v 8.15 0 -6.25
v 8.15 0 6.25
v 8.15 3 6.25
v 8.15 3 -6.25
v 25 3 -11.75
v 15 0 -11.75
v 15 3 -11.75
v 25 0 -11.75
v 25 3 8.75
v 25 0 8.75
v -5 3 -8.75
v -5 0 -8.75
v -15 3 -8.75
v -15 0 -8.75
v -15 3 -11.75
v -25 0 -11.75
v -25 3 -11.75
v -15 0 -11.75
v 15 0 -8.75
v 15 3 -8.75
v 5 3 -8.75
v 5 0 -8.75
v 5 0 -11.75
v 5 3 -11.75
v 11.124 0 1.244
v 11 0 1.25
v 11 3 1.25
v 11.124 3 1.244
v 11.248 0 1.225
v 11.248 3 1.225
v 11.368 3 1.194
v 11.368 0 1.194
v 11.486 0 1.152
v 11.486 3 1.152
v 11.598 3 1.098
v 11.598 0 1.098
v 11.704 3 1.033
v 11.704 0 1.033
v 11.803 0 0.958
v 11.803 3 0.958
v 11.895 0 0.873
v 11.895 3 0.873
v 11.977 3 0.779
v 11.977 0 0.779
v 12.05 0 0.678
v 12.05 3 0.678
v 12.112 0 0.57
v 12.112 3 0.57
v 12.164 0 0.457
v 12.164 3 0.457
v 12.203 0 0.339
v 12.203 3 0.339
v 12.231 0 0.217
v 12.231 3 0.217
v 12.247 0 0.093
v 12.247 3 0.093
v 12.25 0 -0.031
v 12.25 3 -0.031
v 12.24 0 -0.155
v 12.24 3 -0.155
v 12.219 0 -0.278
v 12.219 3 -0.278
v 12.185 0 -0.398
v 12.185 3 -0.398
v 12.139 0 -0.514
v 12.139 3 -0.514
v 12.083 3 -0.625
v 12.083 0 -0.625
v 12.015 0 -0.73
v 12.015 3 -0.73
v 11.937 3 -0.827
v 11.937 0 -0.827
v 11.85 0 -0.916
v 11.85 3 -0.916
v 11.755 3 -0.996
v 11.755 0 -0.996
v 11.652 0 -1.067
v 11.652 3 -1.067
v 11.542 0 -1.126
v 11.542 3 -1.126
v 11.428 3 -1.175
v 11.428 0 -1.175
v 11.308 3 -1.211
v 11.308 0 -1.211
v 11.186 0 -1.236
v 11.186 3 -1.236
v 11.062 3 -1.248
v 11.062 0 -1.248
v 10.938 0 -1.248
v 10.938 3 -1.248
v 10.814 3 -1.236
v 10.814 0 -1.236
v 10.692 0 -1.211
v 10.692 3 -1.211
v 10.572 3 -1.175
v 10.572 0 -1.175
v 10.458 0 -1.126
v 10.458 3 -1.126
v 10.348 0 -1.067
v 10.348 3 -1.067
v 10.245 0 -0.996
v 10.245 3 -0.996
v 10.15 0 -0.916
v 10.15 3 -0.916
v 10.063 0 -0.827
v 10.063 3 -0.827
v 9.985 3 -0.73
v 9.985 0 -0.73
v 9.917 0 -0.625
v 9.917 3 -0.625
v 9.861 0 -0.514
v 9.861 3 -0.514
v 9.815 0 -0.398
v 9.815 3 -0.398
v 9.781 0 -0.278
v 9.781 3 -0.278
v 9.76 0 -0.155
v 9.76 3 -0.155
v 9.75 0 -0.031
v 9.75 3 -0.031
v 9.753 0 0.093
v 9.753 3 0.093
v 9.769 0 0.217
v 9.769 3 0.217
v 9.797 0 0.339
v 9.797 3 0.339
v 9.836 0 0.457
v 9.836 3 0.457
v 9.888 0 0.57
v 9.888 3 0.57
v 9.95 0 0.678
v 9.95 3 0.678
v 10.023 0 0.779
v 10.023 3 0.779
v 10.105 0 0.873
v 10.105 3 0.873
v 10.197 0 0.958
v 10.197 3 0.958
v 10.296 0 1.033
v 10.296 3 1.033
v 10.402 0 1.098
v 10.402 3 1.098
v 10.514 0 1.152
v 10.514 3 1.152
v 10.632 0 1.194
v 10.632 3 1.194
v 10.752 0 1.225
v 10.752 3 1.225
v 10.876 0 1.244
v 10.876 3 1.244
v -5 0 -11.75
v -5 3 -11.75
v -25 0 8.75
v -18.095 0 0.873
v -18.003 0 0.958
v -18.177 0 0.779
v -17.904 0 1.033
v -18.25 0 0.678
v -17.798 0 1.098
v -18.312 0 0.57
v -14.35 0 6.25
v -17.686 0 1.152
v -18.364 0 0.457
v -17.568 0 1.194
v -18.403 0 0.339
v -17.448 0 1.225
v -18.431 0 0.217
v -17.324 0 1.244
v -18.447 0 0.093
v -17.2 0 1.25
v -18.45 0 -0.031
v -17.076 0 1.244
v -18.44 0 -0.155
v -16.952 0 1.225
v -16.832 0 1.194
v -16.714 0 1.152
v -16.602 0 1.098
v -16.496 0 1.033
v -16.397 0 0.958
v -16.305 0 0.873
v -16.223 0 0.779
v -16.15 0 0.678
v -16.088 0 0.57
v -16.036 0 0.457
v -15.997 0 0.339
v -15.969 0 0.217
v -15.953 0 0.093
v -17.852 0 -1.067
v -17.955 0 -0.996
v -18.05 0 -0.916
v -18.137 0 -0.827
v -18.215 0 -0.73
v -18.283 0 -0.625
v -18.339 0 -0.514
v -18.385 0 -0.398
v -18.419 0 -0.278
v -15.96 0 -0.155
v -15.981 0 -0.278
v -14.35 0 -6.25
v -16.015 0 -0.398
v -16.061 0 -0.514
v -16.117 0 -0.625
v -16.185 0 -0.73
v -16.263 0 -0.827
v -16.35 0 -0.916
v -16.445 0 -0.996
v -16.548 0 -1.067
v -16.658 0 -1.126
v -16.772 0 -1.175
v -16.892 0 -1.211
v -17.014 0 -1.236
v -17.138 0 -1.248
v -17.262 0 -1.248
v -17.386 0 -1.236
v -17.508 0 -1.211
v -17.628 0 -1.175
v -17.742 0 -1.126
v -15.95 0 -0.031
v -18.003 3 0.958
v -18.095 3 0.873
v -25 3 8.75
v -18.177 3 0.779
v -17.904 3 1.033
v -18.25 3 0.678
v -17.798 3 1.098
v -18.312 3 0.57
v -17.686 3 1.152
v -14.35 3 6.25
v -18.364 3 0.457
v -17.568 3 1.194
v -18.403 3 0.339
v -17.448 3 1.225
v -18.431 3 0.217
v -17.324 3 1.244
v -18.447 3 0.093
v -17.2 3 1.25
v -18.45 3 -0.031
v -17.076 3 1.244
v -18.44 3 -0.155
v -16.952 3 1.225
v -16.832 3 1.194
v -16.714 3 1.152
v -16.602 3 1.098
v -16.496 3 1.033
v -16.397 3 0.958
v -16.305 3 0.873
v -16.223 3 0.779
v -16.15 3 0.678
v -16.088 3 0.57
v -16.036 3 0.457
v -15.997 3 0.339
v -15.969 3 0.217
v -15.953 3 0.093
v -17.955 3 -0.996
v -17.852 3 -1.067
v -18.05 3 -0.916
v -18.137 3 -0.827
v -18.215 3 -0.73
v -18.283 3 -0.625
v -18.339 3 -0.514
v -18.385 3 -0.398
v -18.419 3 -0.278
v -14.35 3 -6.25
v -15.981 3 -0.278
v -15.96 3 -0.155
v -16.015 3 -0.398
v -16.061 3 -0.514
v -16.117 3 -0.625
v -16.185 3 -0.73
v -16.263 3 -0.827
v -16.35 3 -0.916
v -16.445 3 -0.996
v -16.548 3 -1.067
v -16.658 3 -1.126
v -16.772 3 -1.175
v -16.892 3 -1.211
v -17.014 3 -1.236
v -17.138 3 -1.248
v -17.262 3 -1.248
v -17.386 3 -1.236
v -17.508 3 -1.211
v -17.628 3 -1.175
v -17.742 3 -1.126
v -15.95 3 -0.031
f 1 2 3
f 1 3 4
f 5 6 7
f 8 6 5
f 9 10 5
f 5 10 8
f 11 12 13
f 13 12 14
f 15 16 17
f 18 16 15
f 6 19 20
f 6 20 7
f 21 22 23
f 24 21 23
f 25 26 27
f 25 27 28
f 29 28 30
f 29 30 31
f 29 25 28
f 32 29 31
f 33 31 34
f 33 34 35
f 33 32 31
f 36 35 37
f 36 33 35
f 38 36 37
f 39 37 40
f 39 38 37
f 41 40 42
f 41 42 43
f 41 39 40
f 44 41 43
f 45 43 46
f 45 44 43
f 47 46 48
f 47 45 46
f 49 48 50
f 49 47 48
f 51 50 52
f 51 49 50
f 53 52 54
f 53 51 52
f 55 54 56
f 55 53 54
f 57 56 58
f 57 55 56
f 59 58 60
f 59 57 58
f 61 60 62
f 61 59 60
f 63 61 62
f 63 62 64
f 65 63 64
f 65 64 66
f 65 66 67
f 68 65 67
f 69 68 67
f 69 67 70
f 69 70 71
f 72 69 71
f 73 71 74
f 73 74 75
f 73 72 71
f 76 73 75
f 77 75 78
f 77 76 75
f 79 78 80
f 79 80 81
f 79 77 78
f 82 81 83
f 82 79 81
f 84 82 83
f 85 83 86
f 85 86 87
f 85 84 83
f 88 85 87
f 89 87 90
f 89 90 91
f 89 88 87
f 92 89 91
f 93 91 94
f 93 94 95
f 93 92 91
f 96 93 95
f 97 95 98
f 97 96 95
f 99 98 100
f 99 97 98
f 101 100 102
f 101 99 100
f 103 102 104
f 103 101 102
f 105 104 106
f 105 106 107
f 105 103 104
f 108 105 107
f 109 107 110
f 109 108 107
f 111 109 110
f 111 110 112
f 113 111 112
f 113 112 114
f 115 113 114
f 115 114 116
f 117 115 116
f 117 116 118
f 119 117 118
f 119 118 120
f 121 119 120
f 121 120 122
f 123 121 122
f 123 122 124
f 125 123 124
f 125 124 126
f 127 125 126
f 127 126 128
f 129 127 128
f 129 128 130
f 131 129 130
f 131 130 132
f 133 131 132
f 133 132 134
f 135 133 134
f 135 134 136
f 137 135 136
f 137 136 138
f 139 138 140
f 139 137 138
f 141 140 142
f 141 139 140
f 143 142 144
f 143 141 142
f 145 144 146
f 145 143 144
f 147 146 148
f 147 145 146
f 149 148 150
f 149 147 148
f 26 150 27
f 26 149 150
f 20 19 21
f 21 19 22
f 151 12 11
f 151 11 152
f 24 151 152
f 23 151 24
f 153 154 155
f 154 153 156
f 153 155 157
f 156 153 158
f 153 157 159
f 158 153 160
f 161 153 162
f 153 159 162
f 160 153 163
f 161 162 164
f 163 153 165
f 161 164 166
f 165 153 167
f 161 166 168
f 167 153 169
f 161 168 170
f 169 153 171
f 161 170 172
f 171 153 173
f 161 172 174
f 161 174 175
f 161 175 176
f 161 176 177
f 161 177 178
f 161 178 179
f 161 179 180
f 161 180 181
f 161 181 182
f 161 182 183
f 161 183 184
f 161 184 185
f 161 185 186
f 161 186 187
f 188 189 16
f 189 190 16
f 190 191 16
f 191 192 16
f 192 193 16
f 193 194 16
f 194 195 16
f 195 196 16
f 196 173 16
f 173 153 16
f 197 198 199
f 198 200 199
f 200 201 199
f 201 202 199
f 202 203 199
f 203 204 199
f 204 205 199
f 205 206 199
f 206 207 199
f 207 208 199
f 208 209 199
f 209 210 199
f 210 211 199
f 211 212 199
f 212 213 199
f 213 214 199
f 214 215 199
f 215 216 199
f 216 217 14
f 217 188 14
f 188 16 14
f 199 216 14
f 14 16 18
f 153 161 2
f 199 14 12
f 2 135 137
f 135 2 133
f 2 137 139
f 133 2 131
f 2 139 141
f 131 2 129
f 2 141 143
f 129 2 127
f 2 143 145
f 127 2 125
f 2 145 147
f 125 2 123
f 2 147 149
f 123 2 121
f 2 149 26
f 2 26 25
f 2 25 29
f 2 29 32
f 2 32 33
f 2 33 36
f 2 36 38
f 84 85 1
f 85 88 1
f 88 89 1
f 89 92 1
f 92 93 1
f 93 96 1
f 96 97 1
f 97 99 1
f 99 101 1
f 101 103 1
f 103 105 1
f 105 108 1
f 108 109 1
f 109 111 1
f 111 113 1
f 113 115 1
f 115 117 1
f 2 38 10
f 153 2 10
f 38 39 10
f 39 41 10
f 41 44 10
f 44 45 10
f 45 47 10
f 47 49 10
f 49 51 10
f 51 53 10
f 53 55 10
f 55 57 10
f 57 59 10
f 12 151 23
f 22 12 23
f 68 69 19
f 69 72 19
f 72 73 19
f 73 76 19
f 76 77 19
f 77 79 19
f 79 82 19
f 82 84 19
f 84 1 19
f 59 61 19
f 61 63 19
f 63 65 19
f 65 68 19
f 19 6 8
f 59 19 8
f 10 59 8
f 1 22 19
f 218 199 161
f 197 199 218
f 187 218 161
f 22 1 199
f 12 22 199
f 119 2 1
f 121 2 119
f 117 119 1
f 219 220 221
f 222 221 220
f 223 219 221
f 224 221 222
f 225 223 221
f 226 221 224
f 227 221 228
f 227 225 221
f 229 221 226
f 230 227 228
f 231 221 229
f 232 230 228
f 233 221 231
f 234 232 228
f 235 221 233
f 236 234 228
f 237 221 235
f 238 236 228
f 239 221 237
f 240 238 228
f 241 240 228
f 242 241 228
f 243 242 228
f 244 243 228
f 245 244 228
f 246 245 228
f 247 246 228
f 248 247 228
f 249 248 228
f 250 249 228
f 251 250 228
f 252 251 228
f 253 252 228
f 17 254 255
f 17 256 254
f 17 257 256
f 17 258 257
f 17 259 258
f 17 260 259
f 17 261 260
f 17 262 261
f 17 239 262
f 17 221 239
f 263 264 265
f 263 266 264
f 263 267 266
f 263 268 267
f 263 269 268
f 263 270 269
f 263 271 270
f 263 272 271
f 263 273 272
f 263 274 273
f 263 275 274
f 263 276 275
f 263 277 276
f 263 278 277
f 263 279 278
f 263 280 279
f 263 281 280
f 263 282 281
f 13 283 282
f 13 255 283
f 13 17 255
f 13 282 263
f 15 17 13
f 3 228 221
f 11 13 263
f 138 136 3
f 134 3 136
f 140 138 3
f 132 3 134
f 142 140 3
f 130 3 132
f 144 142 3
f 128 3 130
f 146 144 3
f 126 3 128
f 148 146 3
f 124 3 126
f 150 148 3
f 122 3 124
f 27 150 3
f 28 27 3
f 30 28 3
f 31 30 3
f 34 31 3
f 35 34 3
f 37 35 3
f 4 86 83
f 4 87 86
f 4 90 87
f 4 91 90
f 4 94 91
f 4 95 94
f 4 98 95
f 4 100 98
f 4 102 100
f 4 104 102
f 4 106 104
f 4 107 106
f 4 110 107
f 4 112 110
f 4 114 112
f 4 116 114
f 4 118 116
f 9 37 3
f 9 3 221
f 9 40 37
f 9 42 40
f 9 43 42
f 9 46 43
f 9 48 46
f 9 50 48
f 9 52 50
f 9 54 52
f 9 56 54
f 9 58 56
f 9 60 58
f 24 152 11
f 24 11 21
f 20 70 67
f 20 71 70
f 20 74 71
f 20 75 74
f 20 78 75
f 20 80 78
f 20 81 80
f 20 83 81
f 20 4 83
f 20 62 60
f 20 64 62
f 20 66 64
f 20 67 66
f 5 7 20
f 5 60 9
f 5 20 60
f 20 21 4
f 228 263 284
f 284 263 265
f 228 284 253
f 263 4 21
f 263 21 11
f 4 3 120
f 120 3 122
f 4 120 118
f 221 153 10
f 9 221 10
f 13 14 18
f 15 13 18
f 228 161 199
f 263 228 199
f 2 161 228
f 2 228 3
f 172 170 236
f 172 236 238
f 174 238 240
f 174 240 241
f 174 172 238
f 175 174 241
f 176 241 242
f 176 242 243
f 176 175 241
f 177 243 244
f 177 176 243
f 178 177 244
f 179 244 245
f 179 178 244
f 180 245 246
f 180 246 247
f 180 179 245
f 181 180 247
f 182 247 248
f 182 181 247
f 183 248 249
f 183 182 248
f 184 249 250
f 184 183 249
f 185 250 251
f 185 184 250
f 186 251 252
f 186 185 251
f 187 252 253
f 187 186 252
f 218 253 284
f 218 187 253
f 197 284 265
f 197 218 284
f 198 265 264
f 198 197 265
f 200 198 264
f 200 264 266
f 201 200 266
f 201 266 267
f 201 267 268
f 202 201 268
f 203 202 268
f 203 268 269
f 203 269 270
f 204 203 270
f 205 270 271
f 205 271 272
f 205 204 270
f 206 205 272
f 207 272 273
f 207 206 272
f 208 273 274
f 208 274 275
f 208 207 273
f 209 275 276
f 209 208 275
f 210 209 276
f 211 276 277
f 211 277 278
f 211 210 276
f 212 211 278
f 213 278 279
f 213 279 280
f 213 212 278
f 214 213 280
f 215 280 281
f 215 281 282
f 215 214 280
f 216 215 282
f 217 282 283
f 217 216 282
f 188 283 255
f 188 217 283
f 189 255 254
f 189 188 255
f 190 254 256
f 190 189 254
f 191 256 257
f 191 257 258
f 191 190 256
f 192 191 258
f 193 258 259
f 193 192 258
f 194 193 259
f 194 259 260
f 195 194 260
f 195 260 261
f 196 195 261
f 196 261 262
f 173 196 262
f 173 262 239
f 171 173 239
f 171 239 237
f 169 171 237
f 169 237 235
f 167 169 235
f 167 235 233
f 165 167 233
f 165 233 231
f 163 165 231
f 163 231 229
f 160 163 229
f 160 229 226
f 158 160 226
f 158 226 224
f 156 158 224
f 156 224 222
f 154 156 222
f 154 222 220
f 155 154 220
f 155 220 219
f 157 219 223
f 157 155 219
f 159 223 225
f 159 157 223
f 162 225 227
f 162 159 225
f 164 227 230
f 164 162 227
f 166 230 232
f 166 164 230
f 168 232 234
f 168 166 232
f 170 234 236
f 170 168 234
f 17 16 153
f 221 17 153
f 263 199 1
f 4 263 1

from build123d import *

# Parameters (mm, degrees)
CROQUIS1_R              = 1.25
CROQUIS1_W              = 22.5
CROQUIS1_H              = 12.5
CROQUIS1_W_2            = 10
CROQUIS1_H_2            = 3
SALIENTE_EXTRUIR1_DEPTH = 3


with BuildPart() as part:
    # Croquis1 → Saliente-Extruir1 (new body)
    # profile 1 of 4: a face of its own
    with BuildSketch(Plane(origin=(0, 0, 0), x_dir=(1, 0, 0), z_dir=(0, 1, 0))):
        Polygon((-25, 8.75), (-25, -8.75), (25, -8.75), (25, 8.75), (15, 8.75), (5, 8.75), (-5, 8.75), (-15, 8.75), align=None)
        with Locations(Location((-17.2, 0, 0), (0, 0, 270))):
            Circle(CROQUIS1_R, mode=Mode.SUBTRACT)
        with Locations((-3.1, 0)):
            Rectangle(CROQUIS1_W, CROQUIS1_H, mode=Mode.SUBTRACT)
        with Locations(Location((11, 0, 0), (0, 0, 270))):
            Circle(CROQUIS1_R, mode=Mode.SUBTRACT)
    # profile 2 of 4: a face of its own
    with BuildSketch(Plane(origin=(0, 0, 0), x_dir=(1, 0, 0), z_dir=(0, 1, 0))):
        with Locations((-20, 10.25)):
            Rectangle(CROQUIS1_W_2, CROQUIS1_H_2)
    # profile 3 of 4: a face of its own
    with BuildSketch(Plane(origin=(0, 0, 0), x_dir=(1, 0, 0), z_dir=(0, 1, 0))):
        with Locations((20, 10.25)):
            Rectangle(CROQUIS1_W_2, CROQUIS1_H_2)
    # profile 4 of 4: a face of its own
    with BuildSketch(Plane(origin=(0, 0, 0), x_dir=(1, 0, 0), z_dir=(0, 1, 0))):
        with Locations((0, 10.25)):
            Rectangle(CROQUIS1_W_2, CROQUIS1_H_2)
    extrude(amount=SALIENTE_EXTRUIR1_DEPTH)


solid = part.part
